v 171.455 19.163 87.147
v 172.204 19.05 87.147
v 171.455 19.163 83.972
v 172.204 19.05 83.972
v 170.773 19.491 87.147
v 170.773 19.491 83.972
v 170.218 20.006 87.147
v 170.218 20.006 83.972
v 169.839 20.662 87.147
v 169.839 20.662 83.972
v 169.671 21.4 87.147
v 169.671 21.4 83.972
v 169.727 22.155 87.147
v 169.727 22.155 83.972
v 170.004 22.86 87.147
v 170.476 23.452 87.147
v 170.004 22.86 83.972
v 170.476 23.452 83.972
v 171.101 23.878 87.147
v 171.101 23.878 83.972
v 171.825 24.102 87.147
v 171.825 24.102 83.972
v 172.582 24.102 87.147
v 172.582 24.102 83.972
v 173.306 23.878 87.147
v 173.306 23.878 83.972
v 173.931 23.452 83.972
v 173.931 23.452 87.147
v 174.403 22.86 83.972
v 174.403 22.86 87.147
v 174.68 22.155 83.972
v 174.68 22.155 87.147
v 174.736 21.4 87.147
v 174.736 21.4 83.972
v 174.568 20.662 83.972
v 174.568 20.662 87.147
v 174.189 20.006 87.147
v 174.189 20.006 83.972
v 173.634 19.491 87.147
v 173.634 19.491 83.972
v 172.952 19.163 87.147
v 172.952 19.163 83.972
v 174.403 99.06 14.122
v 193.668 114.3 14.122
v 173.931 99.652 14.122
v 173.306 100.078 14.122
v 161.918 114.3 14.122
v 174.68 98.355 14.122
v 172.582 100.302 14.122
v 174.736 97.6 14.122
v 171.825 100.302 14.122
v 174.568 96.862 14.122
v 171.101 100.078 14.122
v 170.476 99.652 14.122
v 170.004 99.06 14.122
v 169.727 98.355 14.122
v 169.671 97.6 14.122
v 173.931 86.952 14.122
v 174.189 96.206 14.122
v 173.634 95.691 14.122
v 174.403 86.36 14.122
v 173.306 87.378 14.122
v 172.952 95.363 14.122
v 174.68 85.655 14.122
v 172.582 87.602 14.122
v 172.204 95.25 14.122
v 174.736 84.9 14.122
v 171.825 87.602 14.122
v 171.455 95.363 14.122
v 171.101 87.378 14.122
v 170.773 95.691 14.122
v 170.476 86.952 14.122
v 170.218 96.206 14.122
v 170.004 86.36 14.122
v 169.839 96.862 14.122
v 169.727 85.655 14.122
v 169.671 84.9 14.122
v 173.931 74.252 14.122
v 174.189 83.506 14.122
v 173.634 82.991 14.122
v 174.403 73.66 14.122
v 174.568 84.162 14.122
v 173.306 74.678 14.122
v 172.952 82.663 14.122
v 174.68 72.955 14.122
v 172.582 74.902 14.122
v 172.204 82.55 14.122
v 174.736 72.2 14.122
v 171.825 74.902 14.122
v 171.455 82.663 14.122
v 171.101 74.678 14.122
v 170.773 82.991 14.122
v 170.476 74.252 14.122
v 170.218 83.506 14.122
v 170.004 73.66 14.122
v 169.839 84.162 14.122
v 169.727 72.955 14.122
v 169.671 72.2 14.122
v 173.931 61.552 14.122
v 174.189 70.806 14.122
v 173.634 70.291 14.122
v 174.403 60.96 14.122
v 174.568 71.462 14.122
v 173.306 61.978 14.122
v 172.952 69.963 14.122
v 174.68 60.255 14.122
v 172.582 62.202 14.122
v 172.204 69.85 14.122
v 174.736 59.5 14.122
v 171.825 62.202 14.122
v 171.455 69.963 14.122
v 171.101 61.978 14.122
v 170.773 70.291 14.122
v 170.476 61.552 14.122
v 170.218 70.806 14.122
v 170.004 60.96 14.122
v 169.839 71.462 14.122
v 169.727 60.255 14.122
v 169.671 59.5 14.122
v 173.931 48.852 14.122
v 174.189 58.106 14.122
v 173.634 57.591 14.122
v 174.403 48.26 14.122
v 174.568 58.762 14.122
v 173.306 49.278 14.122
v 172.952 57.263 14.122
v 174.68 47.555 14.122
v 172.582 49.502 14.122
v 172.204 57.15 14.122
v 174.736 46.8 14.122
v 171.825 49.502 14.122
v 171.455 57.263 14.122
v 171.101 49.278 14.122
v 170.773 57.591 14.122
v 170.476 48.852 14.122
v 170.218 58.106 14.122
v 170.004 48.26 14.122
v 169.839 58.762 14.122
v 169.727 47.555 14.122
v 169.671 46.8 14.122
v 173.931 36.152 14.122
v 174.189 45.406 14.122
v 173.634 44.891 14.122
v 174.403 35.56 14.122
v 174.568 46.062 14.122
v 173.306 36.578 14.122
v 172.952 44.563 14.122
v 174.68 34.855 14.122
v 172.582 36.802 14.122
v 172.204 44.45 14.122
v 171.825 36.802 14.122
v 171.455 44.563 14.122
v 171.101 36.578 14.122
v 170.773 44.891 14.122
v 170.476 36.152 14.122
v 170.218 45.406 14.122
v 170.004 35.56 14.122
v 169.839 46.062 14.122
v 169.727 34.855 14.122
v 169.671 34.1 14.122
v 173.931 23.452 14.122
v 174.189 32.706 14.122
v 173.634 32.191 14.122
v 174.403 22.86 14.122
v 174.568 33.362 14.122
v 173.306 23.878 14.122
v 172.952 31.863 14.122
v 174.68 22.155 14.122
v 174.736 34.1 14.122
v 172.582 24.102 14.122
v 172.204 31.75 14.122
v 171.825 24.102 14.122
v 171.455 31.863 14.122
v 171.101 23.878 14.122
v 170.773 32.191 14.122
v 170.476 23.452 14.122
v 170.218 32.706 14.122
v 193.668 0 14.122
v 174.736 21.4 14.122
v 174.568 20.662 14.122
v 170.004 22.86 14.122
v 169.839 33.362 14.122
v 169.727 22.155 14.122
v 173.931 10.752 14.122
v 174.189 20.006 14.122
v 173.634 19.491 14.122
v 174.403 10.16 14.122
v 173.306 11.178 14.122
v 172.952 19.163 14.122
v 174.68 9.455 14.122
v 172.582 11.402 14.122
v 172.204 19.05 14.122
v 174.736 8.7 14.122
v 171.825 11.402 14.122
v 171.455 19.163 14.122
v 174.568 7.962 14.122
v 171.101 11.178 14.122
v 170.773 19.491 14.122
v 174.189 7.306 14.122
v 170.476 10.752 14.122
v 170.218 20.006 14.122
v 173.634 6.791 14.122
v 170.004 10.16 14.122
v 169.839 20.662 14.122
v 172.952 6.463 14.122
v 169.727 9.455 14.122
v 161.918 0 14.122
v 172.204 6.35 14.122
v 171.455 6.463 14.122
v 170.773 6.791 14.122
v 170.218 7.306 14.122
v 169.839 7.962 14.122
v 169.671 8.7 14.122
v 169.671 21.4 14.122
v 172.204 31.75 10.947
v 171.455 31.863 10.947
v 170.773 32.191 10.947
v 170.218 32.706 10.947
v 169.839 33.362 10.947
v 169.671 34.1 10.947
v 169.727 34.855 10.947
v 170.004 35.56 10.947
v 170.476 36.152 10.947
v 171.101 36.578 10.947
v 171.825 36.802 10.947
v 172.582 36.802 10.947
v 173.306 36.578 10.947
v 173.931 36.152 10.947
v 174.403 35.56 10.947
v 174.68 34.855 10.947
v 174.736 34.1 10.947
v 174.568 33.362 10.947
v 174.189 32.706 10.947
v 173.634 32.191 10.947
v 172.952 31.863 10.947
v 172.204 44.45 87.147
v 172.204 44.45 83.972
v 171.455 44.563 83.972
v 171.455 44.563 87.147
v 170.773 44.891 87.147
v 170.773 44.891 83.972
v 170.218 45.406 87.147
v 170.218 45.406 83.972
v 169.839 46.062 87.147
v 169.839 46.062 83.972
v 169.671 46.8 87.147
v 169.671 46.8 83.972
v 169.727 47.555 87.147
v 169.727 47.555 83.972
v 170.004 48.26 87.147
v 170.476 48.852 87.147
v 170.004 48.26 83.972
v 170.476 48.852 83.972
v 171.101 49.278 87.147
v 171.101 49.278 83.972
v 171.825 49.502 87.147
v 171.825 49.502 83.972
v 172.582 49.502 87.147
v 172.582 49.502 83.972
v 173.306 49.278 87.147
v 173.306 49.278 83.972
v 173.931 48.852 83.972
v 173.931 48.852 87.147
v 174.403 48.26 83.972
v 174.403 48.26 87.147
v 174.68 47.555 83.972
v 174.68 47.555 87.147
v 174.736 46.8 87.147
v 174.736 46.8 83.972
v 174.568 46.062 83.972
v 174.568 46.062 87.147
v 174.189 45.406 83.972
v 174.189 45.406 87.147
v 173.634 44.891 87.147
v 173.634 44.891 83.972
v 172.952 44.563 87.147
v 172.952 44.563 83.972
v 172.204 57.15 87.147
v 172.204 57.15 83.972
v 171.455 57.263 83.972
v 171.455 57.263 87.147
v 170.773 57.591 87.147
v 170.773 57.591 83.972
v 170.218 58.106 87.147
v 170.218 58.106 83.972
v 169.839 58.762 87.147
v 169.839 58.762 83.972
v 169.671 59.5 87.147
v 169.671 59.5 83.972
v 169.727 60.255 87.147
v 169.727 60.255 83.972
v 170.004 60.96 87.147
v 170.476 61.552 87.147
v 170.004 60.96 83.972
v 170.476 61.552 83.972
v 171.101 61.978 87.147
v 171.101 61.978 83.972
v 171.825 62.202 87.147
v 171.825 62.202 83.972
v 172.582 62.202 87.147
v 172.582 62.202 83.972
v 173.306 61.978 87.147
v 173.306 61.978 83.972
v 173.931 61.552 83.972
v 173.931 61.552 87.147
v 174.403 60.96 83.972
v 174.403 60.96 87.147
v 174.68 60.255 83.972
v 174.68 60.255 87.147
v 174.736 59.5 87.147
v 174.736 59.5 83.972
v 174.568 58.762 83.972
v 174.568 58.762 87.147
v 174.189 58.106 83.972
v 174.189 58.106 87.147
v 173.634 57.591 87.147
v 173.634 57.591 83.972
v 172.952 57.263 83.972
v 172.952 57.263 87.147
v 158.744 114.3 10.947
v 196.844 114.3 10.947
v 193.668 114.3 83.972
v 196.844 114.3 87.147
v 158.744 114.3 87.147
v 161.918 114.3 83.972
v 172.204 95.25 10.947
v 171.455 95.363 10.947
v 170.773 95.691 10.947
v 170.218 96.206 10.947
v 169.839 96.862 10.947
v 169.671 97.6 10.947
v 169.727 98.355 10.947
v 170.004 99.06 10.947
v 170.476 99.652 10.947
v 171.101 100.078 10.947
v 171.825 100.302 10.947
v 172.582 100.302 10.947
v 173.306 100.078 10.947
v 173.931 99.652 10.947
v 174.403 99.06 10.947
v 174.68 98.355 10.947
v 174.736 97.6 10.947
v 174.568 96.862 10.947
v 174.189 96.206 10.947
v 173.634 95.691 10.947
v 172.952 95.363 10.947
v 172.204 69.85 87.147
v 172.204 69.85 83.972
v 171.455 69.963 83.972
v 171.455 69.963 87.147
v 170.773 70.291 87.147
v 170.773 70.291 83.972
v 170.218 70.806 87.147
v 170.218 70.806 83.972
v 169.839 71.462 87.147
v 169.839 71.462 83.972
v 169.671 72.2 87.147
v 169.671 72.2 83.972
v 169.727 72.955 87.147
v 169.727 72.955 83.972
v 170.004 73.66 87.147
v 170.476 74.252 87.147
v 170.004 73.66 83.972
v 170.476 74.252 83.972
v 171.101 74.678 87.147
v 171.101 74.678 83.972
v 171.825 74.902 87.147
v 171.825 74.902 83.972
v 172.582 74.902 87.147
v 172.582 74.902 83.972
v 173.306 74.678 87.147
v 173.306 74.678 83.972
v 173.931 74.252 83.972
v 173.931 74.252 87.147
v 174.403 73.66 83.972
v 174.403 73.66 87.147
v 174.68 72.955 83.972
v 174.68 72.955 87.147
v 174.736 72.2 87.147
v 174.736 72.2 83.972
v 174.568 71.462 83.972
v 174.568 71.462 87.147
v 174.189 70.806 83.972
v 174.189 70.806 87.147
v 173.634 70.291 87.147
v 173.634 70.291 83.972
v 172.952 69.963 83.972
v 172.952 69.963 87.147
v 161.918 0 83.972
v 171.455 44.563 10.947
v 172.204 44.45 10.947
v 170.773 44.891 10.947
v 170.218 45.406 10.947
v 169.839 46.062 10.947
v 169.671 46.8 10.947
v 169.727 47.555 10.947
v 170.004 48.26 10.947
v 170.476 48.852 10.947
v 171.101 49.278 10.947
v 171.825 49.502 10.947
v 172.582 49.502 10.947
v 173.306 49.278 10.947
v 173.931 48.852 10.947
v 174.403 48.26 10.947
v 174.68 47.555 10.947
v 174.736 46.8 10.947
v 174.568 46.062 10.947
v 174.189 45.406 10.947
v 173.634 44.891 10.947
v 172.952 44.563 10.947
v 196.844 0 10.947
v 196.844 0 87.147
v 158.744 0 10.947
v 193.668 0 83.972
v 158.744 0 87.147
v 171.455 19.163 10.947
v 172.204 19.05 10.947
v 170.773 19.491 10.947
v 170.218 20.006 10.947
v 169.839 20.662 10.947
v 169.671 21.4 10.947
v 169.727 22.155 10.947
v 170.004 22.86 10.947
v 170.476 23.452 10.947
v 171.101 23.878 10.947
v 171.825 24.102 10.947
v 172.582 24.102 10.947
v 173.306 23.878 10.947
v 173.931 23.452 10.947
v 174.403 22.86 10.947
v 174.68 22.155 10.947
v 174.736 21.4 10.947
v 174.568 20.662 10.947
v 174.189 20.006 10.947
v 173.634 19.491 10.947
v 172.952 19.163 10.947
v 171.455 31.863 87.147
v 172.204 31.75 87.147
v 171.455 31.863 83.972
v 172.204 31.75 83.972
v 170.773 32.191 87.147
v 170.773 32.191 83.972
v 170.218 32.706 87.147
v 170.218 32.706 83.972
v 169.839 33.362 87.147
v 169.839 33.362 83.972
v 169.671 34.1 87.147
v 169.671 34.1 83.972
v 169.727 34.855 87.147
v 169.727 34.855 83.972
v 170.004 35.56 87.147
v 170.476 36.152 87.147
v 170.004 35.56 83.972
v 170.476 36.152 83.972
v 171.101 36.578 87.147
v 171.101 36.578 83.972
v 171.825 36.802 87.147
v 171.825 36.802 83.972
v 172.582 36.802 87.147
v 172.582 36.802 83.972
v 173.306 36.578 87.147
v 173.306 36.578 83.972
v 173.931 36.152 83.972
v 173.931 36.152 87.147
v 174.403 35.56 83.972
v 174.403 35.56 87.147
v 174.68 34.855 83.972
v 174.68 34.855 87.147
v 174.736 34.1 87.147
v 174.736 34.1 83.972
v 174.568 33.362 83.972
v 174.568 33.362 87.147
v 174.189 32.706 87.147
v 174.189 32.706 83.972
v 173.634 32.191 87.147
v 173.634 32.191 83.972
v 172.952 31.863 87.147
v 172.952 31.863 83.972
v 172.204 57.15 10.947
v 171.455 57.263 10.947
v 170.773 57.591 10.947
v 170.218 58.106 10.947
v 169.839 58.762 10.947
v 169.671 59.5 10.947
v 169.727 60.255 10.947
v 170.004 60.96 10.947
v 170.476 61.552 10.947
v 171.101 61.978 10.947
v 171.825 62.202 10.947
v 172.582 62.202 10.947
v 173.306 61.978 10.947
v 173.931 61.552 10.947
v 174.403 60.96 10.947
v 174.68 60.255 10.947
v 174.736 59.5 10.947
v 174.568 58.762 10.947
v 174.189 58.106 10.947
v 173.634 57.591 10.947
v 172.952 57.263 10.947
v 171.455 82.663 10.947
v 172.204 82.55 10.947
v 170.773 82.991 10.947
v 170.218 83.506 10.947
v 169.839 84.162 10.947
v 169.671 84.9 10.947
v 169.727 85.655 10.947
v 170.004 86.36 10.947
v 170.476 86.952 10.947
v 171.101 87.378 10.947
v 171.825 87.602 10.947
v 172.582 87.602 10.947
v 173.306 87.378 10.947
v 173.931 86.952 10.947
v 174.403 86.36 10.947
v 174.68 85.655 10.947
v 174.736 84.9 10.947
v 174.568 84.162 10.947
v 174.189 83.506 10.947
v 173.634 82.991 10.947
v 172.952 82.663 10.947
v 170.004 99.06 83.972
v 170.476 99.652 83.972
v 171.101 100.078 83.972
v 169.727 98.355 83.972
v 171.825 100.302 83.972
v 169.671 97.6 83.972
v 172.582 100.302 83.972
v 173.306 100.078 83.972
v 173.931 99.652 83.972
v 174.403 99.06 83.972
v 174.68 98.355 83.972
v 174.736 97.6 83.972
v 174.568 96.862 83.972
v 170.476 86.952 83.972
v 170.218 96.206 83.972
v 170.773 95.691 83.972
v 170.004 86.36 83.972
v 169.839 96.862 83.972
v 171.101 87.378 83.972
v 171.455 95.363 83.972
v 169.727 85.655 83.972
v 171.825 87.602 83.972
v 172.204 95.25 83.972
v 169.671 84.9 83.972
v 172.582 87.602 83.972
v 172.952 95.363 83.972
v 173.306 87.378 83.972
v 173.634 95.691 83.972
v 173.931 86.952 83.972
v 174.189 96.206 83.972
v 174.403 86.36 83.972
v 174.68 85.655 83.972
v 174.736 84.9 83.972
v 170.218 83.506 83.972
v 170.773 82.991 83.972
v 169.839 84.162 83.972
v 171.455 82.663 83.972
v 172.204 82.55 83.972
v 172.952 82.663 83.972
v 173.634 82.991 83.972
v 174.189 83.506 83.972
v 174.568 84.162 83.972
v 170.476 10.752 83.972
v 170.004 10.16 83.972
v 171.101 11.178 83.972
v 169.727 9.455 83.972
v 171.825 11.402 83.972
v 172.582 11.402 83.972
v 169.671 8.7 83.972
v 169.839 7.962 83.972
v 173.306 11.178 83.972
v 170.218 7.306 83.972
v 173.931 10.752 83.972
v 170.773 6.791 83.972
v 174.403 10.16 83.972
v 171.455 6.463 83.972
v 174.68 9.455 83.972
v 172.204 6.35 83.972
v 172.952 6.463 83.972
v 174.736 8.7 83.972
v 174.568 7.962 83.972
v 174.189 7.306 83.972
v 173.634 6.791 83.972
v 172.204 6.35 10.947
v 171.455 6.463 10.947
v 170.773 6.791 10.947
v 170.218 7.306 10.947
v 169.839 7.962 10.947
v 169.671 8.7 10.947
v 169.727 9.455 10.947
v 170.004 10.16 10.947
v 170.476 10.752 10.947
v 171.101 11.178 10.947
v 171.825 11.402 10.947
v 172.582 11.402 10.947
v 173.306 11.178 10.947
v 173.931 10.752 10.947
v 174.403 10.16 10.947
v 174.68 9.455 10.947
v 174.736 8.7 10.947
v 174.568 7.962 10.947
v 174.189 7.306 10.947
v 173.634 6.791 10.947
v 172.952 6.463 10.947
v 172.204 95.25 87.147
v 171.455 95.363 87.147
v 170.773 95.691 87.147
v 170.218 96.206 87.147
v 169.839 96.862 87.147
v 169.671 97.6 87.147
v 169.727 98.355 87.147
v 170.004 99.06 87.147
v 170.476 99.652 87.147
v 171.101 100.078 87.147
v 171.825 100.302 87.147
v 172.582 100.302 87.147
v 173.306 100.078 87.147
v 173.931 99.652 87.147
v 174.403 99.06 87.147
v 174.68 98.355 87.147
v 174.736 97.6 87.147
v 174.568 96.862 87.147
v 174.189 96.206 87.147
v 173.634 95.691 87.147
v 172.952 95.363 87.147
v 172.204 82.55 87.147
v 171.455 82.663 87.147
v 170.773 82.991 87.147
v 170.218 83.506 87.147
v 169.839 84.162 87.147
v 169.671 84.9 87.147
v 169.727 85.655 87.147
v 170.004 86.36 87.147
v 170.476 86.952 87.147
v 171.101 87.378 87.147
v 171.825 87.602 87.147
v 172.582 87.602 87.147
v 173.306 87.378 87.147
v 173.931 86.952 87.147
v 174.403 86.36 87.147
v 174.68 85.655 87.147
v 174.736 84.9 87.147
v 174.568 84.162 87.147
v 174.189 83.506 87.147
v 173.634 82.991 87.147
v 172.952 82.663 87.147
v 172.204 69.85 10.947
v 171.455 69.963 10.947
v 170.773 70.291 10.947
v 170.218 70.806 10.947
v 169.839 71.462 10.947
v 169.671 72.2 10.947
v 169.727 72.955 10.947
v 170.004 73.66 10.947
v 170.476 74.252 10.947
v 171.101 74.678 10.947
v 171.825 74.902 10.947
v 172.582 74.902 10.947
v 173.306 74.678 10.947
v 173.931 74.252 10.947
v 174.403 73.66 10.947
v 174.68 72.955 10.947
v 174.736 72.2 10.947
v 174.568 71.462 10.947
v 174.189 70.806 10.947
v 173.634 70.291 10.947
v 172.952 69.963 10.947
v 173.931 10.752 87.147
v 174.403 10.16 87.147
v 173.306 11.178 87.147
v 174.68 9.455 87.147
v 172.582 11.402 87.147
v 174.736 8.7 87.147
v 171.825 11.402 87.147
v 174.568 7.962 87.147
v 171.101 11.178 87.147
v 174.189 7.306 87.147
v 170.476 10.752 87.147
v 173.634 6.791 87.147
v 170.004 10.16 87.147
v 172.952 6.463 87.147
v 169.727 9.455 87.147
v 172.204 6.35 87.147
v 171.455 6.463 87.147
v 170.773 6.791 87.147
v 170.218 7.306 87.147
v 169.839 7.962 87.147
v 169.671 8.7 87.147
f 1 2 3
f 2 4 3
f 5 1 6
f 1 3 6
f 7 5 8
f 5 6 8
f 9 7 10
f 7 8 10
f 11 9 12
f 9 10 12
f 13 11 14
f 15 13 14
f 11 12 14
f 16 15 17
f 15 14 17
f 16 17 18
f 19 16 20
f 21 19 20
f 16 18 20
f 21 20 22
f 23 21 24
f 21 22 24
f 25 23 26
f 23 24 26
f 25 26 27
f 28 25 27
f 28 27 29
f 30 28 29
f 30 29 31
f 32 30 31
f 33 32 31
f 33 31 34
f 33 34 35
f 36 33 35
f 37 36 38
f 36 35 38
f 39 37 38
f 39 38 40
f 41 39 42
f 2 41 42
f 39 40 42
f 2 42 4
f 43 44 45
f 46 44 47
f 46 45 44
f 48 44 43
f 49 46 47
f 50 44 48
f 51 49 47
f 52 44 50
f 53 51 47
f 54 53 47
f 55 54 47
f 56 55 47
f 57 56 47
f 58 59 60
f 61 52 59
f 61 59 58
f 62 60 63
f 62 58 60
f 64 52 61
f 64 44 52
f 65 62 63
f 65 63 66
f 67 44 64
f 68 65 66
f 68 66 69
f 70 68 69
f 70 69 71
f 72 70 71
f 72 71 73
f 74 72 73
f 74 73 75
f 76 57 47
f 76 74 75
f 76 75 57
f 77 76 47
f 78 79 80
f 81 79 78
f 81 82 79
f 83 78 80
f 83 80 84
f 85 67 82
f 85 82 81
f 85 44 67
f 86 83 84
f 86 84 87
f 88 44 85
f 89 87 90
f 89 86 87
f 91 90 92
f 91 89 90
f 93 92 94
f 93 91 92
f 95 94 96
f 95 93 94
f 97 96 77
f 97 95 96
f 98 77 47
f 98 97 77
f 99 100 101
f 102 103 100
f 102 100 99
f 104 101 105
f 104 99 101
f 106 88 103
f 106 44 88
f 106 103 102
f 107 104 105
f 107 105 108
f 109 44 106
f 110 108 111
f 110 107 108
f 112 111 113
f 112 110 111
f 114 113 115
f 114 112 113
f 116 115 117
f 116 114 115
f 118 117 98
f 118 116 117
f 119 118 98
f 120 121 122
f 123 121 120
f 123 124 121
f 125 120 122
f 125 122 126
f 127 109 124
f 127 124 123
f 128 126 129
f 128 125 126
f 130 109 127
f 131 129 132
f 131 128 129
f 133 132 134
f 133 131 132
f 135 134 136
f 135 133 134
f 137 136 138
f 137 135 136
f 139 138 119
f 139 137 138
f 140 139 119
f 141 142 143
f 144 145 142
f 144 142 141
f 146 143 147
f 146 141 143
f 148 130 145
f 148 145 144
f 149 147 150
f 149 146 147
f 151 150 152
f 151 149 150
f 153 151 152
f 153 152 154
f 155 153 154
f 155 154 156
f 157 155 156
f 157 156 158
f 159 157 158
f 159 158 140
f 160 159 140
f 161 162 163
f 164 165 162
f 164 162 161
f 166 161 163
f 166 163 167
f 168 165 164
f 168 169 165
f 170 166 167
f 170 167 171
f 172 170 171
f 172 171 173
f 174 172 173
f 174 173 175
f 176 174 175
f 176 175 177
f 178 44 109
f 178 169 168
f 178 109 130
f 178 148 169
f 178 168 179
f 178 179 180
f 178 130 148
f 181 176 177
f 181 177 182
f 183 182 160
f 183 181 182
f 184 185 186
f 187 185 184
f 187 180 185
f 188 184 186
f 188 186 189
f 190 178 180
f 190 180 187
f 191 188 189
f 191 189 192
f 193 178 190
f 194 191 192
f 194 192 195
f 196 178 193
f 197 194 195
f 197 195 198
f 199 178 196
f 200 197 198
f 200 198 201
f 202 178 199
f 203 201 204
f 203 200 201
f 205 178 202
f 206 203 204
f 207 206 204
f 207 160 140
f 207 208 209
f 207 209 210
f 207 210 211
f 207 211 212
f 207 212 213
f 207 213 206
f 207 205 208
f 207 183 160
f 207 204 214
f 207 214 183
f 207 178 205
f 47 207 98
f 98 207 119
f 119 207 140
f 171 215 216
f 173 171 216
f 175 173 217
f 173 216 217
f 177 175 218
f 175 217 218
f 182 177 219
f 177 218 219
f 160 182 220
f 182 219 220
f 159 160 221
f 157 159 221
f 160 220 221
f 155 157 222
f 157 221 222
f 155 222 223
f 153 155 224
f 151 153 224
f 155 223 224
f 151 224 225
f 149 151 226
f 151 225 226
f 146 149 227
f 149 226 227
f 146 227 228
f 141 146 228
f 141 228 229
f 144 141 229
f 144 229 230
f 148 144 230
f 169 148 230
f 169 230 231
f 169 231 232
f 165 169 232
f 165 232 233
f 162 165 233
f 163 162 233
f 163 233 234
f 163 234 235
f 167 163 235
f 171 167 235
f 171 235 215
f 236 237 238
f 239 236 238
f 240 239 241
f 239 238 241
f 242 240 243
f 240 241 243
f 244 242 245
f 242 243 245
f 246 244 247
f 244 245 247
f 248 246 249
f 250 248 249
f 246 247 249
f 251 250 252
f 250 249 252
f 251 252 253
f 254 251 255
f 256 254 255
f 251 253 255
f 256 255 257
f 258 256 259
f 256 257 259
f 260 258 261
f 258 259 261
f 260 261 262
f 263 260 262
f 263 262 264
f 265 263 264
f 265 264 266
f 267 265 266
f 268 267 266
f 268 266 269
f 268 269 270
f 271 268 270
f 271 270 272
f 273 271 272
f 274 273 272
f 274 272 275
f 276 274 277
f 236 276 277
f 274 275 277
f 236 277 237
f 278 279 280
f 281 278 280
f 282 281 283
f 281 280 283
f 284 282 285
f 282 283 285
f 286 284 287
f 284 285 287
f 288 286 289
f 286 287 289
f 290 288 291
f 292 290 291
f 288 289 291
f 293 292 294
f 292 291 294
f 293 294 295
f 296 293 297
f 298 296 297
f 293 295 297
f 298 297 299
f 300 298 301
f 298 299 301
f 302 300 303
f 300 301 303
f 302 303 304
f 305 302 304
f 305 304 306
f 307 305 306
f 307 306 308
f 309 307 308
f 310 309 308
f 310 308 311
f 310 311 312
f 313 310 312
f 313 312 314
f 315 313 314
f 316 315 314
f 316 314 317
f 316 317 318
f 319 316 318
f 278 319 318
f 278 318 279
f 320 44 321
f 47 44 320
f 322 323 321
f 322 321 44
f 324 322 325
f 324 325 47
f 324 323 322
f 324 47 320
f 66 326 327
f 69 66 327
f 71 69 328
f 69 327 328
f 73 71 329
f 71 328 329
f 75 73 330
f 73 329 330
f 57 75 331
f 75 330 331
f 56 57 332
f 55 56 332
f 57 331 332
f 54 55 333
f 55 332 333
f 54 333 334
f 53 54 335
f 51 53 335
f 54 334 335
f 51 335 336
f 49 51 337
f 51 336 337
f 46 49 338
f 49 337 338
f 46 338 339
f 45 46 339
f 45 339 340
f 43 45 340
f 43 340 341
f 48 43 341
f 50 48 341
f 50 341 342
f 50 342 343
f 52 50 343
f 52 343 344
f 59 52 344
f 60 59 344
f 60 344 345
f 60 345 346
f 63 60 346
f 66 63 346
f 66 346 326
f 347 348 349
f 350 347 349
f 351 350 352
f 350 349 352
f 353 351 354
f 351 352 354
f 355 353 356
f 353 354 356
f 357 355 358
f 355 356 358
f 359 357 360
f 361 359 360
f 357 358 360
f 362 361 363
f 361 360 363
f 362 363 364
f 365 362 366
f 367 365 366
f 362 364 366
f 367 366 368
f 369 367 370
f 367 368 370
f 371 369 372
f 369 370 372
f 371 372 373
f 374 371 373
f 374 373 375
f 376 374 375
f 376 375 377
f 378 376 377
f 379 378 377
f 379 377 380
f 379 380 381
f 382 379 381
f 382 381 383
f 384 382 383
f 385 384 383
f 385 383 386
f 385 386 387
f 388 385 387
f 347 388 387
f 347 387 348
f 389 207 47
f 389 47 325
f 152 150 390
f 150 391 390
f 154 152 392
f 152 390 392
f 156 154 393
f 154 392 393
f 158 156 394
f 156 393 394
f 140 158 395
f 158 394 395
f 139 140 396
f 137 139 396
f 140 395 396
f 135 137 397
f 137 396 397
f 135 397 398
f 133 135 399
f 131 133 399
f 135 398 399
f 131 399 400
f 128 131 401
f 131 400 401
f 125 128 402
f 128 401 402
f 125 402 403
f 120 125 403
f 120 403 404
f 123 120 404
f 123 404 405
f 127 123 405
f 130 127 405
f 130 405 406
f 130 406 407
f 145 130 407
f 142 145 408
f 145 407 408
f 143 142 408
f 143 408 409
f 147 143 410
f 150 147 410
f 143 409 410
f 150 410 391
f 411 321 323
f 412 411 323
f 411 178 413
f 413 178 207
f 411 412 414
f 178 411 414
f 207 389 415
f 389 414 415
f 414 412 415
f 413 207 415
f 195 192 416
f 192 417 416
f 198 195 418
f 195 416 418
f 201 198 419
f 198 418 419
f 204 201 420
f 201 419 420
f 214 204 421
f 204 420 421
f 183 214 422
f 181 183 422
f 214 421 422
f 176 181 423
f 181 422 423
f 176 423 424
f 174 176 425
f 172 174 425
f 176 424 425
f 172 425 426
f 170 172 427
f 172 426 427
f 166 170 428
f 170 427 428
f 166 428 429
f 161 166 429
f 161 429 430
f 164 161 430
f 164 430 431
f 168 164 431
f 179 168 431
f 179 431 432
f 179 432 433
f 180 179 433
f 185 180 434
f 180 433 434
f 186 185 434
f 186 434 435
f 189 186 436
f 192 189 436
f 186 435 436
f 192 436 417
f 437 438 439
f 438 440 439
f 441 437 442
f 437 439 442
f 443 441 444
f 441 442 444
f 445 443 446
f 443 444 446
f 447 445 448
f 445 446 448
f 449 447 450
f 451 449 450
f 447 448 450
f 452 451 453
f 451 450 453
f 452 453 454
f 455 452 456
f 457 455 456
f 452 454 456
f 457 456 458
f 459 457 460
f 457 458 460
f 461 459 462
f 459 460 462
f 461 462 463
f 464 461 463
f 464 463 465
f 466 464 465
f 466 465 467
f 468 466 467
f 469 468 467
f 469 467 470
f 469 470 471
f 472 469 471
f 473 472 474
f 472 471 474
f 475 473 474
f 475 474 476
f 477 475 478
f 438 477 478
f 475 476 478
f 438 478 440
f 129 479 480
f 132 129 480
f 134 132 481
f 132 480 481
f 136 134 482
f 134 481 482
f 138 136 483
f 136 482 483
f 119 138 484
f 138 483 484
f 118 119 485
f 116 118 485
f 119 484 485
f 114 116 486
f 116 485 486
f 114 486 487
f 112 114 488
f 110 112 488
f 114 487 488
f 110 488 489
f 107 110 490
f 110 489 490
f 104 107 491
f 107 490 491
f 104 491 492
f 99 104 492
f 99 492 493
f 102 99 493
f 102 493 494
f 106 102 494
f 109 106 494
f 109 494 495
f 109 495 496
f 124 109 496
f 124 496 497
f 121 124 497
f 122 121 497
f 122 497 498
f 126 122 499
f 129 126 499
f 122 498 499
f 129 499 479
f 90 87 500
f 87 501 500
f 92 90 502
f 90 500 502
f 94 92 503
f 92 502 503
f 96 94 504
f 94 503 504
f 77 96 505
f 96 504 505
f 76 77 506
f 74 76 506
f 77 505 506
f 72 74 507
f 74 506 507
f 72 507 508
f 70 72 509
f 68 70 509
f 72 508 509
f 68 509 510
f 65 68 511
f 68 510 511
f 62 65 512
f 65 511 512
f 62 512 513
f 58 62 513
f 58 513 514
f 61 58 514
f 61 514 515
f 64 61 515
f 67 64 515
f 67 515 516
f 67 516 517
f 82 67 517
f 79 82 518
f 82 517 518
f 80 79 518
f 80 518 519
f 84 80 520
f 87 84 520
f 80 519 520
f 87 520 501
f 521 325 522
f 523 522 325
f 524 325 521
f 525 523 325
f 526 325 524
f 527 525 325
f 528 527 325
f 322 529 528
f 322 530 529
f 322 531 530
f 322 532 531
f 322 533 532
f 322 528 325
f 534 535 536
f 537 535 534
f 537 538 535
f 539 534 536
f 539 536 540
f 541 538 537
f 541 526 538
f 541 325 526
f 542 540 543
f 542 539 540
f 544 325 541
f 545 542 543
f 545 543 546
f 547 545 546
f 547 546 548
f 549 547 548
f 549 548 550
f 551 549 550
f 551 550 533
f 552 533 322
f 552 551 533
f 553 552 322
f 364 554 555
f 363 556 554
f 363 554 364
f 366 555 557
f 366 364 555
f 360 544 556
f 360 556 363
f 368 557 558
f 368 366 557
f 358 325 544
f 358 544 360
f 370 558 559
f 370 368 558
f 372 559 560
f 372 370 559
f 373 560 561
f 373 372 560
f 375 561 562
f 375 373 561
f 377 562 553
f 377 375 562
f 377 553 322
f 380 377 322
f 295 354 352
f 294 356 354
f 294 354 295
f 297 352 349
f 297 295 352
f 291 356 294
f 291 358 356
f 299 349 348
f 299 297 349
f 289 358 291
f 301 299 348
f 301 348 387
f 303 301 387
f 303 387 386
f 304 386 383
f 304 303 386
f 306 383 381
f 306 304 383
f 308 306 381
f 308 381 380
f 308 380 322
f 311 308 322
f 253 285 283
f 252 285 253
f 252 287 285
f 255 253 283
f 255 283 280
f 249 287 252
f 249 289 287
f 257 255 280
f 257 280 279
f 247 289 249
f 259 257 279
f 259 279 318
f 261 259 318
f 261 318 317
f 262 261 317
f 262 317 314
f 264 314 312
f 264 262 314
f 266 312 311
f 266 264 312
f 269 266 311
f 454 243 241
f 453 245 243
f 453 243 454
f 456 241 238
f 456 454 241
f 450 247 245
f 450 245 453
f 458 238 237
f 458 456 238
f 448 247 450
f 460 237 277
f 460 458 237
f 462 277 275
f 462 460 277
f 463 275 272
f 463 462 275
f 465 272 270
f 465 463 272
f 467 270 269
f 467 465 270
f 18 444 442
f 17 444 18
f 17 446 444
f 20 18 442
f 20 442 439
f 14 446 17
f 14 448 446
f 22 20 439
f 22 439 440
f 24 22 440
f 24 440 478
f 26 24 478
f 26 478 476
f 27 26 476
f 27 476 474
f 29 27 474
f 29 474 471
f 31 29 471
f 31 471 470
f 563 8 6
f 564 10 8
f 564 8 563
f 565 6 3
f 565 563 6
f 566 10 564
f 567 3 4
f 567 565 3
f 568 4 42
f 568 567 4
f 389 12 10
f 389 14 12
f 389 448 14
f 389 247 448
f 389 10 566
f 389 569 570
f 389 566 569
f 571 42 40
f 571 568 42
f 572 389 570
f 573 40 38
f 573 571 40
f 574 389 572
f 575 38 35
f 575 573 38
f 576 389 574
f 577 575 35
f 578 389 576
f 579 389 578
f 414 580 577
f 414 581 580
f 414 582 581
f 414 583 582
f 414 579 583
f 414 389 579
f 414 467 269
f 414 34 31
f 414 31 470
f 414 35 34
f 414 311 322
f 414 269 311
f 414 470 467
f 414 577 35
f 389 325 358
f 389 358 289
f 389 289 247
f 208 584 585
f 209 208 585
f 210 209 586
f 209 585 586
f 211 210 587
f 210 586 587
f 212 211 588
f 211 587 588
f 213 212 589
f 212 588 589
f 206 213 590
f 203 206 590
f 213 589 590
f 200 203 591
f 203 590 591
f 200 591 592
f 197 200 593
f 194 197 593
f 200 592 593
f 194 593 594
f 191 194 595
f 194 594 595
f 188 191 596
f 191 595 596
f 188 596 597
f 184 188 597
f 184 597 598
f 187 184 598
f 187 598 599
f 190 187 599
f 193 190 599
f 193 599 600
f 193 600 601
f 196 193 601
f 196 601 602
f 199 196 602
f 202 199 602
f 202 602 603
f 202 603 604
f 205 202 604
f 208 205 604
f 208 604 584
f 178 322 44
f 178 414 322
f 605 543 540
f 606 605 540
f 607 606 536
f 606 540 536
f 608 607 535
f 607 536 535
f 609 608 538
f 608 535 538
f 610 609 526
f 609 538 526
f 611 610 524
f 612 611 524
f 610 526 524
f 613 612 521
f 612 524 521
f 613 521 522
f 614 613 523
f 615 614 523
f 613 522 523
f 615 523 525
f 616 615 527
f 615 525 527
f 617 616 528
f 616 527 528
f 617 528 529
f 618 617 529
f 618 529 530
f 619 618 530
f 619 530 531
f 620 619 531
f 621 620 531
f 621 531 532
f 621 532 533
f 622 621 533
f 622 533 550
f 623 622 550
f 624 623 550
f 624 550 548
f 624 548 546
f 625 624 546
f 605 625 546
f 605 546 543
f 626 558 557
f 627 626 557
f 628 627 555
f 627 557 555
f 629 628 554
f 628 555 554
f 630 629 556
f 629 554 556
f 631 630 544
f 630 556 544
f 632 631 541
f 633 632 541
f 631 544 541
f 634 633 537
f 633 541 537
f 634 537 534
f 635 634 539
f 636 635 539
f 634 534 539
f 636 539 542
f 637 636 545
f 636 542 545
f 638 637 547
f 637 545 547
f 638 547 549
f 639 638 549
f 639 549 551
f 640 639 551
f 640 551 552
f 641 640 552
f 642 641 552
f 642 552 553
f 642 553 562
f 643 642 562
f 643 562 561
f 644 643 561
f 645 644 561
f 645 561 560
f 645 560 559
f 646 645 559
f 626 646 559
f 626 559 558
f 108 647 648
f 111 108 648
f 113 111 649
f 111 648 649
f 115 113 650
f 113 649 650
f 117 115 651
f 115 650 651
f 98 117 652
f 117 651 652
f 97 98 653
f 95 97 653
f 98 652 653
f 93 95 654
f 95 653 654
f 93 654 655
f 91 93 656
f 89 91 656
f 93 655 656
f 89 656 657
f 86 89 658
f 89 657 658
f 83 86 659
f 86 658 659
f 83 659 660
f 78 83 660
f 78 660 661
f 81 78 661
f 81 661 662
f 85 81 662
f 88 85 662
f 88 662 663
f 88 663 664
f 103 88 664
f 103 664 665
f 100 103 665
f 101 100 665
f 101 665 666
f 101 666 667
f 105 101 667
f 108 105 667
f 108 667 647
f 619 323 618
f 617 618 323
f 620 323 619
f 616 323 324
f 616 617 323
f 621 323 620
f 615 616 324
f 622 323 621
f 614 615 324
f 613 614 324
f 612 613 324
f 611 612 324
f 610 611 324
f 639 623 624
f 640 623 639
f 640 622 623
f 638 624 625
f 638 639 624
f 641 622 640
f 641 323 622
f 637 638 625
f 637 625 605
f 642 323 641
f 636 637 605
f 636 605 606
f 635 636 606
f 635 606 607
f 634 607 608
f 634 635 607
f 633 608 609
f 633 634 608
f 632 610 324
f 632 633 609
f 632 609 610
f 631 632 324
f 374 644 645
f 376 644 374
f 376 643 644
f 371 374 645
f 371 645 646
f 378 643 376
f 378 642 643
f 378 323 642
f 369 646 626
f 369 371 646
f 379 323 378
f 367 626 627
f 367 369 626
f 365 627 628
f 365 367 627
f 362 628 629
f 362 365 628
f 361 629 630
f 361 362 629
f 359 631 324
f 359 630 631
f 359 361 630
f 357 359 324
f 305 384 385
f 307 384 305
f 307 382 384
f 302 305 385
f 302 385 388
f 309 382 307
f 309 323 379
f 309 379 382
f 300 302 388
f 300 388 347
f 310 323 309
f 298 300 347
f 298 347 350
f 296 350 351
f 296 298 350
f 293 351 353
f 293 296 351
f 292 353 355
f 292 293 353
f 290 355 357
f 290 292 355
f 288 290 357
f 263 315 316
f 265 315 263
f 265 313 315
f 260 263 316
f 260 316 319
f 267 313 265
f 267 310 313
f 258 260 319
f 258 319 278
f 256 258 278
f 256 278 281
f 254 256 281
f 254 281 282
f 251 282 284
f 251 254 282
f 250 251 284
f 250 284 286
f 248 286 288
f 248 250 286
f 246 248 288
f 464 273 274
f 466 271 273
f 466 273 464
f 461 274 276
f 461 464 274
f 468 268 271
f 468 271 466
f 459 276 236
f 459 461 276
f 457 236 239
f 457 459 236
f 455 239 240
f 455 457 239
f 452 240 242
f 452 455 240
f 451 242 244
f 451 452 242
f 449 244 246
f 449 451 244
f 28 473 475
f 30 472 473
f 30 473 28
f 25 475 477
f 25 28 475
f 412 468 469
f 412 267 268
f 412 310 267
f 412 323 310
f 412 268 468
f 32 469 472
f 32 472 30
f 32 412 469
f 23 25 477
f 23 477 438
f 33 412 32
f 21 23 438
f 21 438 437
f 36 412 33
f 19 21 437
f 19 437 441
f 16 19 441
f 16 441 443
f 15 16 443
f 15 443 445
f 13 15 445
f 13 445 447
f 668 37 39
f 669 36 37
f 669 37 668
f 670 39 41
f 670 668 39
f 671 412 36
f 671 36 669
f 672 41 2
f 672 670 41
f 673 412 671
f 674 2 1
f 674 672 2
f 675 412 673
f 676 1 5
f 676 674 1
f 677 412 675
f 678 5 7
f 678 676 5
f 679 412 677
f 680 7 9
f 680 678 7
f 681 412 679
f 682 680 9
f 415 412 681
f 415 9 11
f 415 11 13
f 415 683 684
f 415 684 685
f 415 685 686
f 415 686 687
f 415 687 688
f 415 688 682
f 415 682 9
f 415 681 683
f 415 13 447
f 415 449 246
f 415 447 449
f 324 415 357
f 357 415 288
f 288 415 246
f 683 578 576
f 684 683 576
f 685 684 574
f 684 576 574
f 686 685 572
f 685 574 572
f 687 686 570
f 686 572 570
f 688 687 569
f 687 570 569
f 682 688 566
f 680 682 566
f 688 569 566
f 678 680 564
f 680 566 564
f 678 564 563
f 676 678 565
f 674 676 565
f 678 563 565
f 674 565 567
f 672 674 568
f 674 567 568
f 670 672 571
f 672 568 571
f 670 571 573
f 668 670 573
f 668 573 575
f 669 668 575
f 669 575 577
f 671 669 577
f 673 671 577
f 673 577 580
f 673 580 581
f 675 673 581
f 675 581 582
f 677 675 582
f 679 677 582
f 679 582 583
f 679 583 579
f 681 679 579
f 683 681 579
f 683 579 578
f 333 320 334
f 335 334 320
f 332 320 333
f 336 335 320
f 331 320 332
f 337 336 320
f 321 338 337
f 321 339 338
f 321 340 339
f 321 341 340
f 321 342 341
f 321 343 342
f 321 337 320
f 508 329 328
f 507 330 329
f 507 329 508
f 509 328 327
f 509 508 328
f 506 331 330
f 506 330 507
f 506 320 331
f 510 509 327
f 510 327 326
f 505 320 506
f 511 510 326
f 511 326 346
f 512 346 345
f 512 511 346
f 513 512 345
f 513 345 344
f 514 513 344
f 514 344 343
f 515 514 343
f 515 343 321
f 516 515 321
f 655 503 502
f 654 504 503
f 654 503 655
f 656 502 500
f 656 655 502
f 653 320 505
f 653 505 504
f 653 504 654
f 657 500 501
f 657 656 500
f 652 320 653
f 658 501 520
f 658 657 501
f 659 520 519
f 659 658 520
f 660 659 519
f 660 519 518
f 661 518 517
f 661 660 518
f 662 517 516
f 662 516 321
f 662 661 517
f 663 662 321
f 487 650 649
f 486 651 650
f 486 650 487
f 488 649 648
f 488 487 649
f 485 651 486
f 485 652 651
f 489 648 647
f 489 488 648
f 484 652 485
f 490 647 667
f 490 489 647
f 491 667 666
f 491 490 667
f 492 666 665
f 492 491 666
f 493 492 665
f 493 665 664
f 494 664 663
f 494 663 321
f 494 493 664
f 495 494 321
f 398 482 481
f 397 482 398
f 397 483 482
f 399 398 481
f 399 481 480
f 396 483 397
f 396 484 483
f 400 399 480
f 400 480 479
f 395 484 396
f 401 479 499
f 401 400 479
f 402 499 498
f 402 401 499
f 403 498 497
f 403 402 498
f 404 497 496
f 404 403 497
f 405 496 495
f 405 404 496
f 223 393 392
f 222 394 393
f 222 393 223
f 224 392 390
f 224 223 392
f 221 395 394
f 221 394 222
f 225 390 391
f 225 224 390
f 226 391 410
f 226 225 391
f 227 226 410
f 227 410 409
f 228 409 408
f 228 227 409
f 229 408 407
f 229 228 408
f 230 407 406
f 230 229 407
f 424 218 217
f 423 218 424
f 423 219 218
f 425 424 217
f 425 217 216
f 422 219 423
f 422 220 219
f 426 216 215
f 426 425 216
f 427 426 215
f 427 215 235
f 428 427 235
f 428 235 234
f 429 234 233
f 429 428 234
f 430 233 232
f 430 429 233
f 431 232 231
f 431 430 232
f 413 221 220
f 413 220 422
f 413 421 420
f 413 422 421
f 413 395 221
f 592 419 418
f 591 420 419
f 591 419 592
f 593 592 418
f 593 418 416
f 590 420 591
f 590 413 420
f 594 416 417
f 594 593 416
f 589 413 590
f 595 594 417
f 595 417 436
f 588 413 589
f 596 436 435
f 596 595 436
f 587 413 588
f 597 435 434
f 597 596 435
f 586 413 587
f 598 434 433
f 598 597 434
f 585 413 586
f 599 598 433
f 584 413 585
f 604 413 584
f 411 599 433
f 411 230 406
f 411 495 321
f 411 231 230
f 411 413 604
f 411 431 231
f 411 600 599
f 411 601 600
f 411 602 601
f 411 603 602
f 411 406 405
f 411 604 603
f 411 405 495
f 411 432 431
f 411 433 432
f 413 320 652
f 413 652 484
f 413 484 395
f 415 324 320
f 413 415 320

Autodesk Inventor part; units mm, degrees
ref_plane "YZ Plane" through (0, 0, 0) normal (1, 0, 0) x (0, 1, 0)
ref_plane "XZ Plane" through (0, 0, 0) normal (0, 1, 0) x (-1, 0, 0)
ref_plane "XY Plane" through (0, 0, 0) normal (0, 0, 1) x (1, 0, 0)
sketch "Sketch1" plane through (0, 0, 0) normal (0, 1, 0) x (-1, 0, 0)
  line L0 (-158.7435, 10.9468) -> (-196.8435, 10.9468)
  line L1 (-196.8435, 10.9468) -> (-196.8435, 87.1468)
  line L2 (-196.8435, 87.1468) -> (-158.7435, 87.1468)
  line L3 (-158.7435, 87.1468) -> (-158.7435, 10.9468)
  line L4 (-161.9185, 83.9718) -> (-193.6685, 83.9718)
  line L5 (-193.6685, 83.9718) -> (-193.6685, 14.1218)
  line L6 (-193.6685, 14.1218) -> (-161.9185, 14.1218)
  line L7 (-161.9185, 14.1218) -> (-161.9185, 83.9718)
  point P0 (0, 0)
  dimension "d0" = 76.2
  dimension "d1" = 38.1
  dimension "d2" = 3.175
extrude "Extrusion1" add sketch "Sketch1" along normal blind 114.3
sketch "Sketch2" plane through (158.7435, 0, 87.1468) normal (0, 0, 1) x (1, 0, 0)
  line L0 (0, 0) -> (0, 114.3) projected
  line L1 (38.1, 0) -> (0, 0) projected
  point P0 (-158.7435, 0)
  point P1 (13.46, 8.89)
  point P2 (13.46, 21.59)
  point P3 (13.46, 34.29)
  point P4 (13.46, 46.99)
  point P5 (13.46, 59.69)
  point P6 (13.46, 72.39)
  point P7 (13.46, 85.09)
  point P8 (13.46, 97.79)
  dimension "d5" = 13.46
  dimension "d6" = 8.89
  dimension "d9" = 12.7
hole "Hole1" at (172.2035, 8.89, 87.1468) at (172.2035, 21.59, 87.1468) at (172.2035, 34.29, 87.1468) at (172.2035, 46.99, 87.1468) at (172.2035, 59.69, 87.1468) at (172.2035, 72.39, 87.1468) at (172.2035, 85.09, 87.1468) at (172.2035, 97.79, 87.1468) direction (0, 0, -1) diameter 5.08 end through all
properties part number "2018 Scissor Standoff Iner"
